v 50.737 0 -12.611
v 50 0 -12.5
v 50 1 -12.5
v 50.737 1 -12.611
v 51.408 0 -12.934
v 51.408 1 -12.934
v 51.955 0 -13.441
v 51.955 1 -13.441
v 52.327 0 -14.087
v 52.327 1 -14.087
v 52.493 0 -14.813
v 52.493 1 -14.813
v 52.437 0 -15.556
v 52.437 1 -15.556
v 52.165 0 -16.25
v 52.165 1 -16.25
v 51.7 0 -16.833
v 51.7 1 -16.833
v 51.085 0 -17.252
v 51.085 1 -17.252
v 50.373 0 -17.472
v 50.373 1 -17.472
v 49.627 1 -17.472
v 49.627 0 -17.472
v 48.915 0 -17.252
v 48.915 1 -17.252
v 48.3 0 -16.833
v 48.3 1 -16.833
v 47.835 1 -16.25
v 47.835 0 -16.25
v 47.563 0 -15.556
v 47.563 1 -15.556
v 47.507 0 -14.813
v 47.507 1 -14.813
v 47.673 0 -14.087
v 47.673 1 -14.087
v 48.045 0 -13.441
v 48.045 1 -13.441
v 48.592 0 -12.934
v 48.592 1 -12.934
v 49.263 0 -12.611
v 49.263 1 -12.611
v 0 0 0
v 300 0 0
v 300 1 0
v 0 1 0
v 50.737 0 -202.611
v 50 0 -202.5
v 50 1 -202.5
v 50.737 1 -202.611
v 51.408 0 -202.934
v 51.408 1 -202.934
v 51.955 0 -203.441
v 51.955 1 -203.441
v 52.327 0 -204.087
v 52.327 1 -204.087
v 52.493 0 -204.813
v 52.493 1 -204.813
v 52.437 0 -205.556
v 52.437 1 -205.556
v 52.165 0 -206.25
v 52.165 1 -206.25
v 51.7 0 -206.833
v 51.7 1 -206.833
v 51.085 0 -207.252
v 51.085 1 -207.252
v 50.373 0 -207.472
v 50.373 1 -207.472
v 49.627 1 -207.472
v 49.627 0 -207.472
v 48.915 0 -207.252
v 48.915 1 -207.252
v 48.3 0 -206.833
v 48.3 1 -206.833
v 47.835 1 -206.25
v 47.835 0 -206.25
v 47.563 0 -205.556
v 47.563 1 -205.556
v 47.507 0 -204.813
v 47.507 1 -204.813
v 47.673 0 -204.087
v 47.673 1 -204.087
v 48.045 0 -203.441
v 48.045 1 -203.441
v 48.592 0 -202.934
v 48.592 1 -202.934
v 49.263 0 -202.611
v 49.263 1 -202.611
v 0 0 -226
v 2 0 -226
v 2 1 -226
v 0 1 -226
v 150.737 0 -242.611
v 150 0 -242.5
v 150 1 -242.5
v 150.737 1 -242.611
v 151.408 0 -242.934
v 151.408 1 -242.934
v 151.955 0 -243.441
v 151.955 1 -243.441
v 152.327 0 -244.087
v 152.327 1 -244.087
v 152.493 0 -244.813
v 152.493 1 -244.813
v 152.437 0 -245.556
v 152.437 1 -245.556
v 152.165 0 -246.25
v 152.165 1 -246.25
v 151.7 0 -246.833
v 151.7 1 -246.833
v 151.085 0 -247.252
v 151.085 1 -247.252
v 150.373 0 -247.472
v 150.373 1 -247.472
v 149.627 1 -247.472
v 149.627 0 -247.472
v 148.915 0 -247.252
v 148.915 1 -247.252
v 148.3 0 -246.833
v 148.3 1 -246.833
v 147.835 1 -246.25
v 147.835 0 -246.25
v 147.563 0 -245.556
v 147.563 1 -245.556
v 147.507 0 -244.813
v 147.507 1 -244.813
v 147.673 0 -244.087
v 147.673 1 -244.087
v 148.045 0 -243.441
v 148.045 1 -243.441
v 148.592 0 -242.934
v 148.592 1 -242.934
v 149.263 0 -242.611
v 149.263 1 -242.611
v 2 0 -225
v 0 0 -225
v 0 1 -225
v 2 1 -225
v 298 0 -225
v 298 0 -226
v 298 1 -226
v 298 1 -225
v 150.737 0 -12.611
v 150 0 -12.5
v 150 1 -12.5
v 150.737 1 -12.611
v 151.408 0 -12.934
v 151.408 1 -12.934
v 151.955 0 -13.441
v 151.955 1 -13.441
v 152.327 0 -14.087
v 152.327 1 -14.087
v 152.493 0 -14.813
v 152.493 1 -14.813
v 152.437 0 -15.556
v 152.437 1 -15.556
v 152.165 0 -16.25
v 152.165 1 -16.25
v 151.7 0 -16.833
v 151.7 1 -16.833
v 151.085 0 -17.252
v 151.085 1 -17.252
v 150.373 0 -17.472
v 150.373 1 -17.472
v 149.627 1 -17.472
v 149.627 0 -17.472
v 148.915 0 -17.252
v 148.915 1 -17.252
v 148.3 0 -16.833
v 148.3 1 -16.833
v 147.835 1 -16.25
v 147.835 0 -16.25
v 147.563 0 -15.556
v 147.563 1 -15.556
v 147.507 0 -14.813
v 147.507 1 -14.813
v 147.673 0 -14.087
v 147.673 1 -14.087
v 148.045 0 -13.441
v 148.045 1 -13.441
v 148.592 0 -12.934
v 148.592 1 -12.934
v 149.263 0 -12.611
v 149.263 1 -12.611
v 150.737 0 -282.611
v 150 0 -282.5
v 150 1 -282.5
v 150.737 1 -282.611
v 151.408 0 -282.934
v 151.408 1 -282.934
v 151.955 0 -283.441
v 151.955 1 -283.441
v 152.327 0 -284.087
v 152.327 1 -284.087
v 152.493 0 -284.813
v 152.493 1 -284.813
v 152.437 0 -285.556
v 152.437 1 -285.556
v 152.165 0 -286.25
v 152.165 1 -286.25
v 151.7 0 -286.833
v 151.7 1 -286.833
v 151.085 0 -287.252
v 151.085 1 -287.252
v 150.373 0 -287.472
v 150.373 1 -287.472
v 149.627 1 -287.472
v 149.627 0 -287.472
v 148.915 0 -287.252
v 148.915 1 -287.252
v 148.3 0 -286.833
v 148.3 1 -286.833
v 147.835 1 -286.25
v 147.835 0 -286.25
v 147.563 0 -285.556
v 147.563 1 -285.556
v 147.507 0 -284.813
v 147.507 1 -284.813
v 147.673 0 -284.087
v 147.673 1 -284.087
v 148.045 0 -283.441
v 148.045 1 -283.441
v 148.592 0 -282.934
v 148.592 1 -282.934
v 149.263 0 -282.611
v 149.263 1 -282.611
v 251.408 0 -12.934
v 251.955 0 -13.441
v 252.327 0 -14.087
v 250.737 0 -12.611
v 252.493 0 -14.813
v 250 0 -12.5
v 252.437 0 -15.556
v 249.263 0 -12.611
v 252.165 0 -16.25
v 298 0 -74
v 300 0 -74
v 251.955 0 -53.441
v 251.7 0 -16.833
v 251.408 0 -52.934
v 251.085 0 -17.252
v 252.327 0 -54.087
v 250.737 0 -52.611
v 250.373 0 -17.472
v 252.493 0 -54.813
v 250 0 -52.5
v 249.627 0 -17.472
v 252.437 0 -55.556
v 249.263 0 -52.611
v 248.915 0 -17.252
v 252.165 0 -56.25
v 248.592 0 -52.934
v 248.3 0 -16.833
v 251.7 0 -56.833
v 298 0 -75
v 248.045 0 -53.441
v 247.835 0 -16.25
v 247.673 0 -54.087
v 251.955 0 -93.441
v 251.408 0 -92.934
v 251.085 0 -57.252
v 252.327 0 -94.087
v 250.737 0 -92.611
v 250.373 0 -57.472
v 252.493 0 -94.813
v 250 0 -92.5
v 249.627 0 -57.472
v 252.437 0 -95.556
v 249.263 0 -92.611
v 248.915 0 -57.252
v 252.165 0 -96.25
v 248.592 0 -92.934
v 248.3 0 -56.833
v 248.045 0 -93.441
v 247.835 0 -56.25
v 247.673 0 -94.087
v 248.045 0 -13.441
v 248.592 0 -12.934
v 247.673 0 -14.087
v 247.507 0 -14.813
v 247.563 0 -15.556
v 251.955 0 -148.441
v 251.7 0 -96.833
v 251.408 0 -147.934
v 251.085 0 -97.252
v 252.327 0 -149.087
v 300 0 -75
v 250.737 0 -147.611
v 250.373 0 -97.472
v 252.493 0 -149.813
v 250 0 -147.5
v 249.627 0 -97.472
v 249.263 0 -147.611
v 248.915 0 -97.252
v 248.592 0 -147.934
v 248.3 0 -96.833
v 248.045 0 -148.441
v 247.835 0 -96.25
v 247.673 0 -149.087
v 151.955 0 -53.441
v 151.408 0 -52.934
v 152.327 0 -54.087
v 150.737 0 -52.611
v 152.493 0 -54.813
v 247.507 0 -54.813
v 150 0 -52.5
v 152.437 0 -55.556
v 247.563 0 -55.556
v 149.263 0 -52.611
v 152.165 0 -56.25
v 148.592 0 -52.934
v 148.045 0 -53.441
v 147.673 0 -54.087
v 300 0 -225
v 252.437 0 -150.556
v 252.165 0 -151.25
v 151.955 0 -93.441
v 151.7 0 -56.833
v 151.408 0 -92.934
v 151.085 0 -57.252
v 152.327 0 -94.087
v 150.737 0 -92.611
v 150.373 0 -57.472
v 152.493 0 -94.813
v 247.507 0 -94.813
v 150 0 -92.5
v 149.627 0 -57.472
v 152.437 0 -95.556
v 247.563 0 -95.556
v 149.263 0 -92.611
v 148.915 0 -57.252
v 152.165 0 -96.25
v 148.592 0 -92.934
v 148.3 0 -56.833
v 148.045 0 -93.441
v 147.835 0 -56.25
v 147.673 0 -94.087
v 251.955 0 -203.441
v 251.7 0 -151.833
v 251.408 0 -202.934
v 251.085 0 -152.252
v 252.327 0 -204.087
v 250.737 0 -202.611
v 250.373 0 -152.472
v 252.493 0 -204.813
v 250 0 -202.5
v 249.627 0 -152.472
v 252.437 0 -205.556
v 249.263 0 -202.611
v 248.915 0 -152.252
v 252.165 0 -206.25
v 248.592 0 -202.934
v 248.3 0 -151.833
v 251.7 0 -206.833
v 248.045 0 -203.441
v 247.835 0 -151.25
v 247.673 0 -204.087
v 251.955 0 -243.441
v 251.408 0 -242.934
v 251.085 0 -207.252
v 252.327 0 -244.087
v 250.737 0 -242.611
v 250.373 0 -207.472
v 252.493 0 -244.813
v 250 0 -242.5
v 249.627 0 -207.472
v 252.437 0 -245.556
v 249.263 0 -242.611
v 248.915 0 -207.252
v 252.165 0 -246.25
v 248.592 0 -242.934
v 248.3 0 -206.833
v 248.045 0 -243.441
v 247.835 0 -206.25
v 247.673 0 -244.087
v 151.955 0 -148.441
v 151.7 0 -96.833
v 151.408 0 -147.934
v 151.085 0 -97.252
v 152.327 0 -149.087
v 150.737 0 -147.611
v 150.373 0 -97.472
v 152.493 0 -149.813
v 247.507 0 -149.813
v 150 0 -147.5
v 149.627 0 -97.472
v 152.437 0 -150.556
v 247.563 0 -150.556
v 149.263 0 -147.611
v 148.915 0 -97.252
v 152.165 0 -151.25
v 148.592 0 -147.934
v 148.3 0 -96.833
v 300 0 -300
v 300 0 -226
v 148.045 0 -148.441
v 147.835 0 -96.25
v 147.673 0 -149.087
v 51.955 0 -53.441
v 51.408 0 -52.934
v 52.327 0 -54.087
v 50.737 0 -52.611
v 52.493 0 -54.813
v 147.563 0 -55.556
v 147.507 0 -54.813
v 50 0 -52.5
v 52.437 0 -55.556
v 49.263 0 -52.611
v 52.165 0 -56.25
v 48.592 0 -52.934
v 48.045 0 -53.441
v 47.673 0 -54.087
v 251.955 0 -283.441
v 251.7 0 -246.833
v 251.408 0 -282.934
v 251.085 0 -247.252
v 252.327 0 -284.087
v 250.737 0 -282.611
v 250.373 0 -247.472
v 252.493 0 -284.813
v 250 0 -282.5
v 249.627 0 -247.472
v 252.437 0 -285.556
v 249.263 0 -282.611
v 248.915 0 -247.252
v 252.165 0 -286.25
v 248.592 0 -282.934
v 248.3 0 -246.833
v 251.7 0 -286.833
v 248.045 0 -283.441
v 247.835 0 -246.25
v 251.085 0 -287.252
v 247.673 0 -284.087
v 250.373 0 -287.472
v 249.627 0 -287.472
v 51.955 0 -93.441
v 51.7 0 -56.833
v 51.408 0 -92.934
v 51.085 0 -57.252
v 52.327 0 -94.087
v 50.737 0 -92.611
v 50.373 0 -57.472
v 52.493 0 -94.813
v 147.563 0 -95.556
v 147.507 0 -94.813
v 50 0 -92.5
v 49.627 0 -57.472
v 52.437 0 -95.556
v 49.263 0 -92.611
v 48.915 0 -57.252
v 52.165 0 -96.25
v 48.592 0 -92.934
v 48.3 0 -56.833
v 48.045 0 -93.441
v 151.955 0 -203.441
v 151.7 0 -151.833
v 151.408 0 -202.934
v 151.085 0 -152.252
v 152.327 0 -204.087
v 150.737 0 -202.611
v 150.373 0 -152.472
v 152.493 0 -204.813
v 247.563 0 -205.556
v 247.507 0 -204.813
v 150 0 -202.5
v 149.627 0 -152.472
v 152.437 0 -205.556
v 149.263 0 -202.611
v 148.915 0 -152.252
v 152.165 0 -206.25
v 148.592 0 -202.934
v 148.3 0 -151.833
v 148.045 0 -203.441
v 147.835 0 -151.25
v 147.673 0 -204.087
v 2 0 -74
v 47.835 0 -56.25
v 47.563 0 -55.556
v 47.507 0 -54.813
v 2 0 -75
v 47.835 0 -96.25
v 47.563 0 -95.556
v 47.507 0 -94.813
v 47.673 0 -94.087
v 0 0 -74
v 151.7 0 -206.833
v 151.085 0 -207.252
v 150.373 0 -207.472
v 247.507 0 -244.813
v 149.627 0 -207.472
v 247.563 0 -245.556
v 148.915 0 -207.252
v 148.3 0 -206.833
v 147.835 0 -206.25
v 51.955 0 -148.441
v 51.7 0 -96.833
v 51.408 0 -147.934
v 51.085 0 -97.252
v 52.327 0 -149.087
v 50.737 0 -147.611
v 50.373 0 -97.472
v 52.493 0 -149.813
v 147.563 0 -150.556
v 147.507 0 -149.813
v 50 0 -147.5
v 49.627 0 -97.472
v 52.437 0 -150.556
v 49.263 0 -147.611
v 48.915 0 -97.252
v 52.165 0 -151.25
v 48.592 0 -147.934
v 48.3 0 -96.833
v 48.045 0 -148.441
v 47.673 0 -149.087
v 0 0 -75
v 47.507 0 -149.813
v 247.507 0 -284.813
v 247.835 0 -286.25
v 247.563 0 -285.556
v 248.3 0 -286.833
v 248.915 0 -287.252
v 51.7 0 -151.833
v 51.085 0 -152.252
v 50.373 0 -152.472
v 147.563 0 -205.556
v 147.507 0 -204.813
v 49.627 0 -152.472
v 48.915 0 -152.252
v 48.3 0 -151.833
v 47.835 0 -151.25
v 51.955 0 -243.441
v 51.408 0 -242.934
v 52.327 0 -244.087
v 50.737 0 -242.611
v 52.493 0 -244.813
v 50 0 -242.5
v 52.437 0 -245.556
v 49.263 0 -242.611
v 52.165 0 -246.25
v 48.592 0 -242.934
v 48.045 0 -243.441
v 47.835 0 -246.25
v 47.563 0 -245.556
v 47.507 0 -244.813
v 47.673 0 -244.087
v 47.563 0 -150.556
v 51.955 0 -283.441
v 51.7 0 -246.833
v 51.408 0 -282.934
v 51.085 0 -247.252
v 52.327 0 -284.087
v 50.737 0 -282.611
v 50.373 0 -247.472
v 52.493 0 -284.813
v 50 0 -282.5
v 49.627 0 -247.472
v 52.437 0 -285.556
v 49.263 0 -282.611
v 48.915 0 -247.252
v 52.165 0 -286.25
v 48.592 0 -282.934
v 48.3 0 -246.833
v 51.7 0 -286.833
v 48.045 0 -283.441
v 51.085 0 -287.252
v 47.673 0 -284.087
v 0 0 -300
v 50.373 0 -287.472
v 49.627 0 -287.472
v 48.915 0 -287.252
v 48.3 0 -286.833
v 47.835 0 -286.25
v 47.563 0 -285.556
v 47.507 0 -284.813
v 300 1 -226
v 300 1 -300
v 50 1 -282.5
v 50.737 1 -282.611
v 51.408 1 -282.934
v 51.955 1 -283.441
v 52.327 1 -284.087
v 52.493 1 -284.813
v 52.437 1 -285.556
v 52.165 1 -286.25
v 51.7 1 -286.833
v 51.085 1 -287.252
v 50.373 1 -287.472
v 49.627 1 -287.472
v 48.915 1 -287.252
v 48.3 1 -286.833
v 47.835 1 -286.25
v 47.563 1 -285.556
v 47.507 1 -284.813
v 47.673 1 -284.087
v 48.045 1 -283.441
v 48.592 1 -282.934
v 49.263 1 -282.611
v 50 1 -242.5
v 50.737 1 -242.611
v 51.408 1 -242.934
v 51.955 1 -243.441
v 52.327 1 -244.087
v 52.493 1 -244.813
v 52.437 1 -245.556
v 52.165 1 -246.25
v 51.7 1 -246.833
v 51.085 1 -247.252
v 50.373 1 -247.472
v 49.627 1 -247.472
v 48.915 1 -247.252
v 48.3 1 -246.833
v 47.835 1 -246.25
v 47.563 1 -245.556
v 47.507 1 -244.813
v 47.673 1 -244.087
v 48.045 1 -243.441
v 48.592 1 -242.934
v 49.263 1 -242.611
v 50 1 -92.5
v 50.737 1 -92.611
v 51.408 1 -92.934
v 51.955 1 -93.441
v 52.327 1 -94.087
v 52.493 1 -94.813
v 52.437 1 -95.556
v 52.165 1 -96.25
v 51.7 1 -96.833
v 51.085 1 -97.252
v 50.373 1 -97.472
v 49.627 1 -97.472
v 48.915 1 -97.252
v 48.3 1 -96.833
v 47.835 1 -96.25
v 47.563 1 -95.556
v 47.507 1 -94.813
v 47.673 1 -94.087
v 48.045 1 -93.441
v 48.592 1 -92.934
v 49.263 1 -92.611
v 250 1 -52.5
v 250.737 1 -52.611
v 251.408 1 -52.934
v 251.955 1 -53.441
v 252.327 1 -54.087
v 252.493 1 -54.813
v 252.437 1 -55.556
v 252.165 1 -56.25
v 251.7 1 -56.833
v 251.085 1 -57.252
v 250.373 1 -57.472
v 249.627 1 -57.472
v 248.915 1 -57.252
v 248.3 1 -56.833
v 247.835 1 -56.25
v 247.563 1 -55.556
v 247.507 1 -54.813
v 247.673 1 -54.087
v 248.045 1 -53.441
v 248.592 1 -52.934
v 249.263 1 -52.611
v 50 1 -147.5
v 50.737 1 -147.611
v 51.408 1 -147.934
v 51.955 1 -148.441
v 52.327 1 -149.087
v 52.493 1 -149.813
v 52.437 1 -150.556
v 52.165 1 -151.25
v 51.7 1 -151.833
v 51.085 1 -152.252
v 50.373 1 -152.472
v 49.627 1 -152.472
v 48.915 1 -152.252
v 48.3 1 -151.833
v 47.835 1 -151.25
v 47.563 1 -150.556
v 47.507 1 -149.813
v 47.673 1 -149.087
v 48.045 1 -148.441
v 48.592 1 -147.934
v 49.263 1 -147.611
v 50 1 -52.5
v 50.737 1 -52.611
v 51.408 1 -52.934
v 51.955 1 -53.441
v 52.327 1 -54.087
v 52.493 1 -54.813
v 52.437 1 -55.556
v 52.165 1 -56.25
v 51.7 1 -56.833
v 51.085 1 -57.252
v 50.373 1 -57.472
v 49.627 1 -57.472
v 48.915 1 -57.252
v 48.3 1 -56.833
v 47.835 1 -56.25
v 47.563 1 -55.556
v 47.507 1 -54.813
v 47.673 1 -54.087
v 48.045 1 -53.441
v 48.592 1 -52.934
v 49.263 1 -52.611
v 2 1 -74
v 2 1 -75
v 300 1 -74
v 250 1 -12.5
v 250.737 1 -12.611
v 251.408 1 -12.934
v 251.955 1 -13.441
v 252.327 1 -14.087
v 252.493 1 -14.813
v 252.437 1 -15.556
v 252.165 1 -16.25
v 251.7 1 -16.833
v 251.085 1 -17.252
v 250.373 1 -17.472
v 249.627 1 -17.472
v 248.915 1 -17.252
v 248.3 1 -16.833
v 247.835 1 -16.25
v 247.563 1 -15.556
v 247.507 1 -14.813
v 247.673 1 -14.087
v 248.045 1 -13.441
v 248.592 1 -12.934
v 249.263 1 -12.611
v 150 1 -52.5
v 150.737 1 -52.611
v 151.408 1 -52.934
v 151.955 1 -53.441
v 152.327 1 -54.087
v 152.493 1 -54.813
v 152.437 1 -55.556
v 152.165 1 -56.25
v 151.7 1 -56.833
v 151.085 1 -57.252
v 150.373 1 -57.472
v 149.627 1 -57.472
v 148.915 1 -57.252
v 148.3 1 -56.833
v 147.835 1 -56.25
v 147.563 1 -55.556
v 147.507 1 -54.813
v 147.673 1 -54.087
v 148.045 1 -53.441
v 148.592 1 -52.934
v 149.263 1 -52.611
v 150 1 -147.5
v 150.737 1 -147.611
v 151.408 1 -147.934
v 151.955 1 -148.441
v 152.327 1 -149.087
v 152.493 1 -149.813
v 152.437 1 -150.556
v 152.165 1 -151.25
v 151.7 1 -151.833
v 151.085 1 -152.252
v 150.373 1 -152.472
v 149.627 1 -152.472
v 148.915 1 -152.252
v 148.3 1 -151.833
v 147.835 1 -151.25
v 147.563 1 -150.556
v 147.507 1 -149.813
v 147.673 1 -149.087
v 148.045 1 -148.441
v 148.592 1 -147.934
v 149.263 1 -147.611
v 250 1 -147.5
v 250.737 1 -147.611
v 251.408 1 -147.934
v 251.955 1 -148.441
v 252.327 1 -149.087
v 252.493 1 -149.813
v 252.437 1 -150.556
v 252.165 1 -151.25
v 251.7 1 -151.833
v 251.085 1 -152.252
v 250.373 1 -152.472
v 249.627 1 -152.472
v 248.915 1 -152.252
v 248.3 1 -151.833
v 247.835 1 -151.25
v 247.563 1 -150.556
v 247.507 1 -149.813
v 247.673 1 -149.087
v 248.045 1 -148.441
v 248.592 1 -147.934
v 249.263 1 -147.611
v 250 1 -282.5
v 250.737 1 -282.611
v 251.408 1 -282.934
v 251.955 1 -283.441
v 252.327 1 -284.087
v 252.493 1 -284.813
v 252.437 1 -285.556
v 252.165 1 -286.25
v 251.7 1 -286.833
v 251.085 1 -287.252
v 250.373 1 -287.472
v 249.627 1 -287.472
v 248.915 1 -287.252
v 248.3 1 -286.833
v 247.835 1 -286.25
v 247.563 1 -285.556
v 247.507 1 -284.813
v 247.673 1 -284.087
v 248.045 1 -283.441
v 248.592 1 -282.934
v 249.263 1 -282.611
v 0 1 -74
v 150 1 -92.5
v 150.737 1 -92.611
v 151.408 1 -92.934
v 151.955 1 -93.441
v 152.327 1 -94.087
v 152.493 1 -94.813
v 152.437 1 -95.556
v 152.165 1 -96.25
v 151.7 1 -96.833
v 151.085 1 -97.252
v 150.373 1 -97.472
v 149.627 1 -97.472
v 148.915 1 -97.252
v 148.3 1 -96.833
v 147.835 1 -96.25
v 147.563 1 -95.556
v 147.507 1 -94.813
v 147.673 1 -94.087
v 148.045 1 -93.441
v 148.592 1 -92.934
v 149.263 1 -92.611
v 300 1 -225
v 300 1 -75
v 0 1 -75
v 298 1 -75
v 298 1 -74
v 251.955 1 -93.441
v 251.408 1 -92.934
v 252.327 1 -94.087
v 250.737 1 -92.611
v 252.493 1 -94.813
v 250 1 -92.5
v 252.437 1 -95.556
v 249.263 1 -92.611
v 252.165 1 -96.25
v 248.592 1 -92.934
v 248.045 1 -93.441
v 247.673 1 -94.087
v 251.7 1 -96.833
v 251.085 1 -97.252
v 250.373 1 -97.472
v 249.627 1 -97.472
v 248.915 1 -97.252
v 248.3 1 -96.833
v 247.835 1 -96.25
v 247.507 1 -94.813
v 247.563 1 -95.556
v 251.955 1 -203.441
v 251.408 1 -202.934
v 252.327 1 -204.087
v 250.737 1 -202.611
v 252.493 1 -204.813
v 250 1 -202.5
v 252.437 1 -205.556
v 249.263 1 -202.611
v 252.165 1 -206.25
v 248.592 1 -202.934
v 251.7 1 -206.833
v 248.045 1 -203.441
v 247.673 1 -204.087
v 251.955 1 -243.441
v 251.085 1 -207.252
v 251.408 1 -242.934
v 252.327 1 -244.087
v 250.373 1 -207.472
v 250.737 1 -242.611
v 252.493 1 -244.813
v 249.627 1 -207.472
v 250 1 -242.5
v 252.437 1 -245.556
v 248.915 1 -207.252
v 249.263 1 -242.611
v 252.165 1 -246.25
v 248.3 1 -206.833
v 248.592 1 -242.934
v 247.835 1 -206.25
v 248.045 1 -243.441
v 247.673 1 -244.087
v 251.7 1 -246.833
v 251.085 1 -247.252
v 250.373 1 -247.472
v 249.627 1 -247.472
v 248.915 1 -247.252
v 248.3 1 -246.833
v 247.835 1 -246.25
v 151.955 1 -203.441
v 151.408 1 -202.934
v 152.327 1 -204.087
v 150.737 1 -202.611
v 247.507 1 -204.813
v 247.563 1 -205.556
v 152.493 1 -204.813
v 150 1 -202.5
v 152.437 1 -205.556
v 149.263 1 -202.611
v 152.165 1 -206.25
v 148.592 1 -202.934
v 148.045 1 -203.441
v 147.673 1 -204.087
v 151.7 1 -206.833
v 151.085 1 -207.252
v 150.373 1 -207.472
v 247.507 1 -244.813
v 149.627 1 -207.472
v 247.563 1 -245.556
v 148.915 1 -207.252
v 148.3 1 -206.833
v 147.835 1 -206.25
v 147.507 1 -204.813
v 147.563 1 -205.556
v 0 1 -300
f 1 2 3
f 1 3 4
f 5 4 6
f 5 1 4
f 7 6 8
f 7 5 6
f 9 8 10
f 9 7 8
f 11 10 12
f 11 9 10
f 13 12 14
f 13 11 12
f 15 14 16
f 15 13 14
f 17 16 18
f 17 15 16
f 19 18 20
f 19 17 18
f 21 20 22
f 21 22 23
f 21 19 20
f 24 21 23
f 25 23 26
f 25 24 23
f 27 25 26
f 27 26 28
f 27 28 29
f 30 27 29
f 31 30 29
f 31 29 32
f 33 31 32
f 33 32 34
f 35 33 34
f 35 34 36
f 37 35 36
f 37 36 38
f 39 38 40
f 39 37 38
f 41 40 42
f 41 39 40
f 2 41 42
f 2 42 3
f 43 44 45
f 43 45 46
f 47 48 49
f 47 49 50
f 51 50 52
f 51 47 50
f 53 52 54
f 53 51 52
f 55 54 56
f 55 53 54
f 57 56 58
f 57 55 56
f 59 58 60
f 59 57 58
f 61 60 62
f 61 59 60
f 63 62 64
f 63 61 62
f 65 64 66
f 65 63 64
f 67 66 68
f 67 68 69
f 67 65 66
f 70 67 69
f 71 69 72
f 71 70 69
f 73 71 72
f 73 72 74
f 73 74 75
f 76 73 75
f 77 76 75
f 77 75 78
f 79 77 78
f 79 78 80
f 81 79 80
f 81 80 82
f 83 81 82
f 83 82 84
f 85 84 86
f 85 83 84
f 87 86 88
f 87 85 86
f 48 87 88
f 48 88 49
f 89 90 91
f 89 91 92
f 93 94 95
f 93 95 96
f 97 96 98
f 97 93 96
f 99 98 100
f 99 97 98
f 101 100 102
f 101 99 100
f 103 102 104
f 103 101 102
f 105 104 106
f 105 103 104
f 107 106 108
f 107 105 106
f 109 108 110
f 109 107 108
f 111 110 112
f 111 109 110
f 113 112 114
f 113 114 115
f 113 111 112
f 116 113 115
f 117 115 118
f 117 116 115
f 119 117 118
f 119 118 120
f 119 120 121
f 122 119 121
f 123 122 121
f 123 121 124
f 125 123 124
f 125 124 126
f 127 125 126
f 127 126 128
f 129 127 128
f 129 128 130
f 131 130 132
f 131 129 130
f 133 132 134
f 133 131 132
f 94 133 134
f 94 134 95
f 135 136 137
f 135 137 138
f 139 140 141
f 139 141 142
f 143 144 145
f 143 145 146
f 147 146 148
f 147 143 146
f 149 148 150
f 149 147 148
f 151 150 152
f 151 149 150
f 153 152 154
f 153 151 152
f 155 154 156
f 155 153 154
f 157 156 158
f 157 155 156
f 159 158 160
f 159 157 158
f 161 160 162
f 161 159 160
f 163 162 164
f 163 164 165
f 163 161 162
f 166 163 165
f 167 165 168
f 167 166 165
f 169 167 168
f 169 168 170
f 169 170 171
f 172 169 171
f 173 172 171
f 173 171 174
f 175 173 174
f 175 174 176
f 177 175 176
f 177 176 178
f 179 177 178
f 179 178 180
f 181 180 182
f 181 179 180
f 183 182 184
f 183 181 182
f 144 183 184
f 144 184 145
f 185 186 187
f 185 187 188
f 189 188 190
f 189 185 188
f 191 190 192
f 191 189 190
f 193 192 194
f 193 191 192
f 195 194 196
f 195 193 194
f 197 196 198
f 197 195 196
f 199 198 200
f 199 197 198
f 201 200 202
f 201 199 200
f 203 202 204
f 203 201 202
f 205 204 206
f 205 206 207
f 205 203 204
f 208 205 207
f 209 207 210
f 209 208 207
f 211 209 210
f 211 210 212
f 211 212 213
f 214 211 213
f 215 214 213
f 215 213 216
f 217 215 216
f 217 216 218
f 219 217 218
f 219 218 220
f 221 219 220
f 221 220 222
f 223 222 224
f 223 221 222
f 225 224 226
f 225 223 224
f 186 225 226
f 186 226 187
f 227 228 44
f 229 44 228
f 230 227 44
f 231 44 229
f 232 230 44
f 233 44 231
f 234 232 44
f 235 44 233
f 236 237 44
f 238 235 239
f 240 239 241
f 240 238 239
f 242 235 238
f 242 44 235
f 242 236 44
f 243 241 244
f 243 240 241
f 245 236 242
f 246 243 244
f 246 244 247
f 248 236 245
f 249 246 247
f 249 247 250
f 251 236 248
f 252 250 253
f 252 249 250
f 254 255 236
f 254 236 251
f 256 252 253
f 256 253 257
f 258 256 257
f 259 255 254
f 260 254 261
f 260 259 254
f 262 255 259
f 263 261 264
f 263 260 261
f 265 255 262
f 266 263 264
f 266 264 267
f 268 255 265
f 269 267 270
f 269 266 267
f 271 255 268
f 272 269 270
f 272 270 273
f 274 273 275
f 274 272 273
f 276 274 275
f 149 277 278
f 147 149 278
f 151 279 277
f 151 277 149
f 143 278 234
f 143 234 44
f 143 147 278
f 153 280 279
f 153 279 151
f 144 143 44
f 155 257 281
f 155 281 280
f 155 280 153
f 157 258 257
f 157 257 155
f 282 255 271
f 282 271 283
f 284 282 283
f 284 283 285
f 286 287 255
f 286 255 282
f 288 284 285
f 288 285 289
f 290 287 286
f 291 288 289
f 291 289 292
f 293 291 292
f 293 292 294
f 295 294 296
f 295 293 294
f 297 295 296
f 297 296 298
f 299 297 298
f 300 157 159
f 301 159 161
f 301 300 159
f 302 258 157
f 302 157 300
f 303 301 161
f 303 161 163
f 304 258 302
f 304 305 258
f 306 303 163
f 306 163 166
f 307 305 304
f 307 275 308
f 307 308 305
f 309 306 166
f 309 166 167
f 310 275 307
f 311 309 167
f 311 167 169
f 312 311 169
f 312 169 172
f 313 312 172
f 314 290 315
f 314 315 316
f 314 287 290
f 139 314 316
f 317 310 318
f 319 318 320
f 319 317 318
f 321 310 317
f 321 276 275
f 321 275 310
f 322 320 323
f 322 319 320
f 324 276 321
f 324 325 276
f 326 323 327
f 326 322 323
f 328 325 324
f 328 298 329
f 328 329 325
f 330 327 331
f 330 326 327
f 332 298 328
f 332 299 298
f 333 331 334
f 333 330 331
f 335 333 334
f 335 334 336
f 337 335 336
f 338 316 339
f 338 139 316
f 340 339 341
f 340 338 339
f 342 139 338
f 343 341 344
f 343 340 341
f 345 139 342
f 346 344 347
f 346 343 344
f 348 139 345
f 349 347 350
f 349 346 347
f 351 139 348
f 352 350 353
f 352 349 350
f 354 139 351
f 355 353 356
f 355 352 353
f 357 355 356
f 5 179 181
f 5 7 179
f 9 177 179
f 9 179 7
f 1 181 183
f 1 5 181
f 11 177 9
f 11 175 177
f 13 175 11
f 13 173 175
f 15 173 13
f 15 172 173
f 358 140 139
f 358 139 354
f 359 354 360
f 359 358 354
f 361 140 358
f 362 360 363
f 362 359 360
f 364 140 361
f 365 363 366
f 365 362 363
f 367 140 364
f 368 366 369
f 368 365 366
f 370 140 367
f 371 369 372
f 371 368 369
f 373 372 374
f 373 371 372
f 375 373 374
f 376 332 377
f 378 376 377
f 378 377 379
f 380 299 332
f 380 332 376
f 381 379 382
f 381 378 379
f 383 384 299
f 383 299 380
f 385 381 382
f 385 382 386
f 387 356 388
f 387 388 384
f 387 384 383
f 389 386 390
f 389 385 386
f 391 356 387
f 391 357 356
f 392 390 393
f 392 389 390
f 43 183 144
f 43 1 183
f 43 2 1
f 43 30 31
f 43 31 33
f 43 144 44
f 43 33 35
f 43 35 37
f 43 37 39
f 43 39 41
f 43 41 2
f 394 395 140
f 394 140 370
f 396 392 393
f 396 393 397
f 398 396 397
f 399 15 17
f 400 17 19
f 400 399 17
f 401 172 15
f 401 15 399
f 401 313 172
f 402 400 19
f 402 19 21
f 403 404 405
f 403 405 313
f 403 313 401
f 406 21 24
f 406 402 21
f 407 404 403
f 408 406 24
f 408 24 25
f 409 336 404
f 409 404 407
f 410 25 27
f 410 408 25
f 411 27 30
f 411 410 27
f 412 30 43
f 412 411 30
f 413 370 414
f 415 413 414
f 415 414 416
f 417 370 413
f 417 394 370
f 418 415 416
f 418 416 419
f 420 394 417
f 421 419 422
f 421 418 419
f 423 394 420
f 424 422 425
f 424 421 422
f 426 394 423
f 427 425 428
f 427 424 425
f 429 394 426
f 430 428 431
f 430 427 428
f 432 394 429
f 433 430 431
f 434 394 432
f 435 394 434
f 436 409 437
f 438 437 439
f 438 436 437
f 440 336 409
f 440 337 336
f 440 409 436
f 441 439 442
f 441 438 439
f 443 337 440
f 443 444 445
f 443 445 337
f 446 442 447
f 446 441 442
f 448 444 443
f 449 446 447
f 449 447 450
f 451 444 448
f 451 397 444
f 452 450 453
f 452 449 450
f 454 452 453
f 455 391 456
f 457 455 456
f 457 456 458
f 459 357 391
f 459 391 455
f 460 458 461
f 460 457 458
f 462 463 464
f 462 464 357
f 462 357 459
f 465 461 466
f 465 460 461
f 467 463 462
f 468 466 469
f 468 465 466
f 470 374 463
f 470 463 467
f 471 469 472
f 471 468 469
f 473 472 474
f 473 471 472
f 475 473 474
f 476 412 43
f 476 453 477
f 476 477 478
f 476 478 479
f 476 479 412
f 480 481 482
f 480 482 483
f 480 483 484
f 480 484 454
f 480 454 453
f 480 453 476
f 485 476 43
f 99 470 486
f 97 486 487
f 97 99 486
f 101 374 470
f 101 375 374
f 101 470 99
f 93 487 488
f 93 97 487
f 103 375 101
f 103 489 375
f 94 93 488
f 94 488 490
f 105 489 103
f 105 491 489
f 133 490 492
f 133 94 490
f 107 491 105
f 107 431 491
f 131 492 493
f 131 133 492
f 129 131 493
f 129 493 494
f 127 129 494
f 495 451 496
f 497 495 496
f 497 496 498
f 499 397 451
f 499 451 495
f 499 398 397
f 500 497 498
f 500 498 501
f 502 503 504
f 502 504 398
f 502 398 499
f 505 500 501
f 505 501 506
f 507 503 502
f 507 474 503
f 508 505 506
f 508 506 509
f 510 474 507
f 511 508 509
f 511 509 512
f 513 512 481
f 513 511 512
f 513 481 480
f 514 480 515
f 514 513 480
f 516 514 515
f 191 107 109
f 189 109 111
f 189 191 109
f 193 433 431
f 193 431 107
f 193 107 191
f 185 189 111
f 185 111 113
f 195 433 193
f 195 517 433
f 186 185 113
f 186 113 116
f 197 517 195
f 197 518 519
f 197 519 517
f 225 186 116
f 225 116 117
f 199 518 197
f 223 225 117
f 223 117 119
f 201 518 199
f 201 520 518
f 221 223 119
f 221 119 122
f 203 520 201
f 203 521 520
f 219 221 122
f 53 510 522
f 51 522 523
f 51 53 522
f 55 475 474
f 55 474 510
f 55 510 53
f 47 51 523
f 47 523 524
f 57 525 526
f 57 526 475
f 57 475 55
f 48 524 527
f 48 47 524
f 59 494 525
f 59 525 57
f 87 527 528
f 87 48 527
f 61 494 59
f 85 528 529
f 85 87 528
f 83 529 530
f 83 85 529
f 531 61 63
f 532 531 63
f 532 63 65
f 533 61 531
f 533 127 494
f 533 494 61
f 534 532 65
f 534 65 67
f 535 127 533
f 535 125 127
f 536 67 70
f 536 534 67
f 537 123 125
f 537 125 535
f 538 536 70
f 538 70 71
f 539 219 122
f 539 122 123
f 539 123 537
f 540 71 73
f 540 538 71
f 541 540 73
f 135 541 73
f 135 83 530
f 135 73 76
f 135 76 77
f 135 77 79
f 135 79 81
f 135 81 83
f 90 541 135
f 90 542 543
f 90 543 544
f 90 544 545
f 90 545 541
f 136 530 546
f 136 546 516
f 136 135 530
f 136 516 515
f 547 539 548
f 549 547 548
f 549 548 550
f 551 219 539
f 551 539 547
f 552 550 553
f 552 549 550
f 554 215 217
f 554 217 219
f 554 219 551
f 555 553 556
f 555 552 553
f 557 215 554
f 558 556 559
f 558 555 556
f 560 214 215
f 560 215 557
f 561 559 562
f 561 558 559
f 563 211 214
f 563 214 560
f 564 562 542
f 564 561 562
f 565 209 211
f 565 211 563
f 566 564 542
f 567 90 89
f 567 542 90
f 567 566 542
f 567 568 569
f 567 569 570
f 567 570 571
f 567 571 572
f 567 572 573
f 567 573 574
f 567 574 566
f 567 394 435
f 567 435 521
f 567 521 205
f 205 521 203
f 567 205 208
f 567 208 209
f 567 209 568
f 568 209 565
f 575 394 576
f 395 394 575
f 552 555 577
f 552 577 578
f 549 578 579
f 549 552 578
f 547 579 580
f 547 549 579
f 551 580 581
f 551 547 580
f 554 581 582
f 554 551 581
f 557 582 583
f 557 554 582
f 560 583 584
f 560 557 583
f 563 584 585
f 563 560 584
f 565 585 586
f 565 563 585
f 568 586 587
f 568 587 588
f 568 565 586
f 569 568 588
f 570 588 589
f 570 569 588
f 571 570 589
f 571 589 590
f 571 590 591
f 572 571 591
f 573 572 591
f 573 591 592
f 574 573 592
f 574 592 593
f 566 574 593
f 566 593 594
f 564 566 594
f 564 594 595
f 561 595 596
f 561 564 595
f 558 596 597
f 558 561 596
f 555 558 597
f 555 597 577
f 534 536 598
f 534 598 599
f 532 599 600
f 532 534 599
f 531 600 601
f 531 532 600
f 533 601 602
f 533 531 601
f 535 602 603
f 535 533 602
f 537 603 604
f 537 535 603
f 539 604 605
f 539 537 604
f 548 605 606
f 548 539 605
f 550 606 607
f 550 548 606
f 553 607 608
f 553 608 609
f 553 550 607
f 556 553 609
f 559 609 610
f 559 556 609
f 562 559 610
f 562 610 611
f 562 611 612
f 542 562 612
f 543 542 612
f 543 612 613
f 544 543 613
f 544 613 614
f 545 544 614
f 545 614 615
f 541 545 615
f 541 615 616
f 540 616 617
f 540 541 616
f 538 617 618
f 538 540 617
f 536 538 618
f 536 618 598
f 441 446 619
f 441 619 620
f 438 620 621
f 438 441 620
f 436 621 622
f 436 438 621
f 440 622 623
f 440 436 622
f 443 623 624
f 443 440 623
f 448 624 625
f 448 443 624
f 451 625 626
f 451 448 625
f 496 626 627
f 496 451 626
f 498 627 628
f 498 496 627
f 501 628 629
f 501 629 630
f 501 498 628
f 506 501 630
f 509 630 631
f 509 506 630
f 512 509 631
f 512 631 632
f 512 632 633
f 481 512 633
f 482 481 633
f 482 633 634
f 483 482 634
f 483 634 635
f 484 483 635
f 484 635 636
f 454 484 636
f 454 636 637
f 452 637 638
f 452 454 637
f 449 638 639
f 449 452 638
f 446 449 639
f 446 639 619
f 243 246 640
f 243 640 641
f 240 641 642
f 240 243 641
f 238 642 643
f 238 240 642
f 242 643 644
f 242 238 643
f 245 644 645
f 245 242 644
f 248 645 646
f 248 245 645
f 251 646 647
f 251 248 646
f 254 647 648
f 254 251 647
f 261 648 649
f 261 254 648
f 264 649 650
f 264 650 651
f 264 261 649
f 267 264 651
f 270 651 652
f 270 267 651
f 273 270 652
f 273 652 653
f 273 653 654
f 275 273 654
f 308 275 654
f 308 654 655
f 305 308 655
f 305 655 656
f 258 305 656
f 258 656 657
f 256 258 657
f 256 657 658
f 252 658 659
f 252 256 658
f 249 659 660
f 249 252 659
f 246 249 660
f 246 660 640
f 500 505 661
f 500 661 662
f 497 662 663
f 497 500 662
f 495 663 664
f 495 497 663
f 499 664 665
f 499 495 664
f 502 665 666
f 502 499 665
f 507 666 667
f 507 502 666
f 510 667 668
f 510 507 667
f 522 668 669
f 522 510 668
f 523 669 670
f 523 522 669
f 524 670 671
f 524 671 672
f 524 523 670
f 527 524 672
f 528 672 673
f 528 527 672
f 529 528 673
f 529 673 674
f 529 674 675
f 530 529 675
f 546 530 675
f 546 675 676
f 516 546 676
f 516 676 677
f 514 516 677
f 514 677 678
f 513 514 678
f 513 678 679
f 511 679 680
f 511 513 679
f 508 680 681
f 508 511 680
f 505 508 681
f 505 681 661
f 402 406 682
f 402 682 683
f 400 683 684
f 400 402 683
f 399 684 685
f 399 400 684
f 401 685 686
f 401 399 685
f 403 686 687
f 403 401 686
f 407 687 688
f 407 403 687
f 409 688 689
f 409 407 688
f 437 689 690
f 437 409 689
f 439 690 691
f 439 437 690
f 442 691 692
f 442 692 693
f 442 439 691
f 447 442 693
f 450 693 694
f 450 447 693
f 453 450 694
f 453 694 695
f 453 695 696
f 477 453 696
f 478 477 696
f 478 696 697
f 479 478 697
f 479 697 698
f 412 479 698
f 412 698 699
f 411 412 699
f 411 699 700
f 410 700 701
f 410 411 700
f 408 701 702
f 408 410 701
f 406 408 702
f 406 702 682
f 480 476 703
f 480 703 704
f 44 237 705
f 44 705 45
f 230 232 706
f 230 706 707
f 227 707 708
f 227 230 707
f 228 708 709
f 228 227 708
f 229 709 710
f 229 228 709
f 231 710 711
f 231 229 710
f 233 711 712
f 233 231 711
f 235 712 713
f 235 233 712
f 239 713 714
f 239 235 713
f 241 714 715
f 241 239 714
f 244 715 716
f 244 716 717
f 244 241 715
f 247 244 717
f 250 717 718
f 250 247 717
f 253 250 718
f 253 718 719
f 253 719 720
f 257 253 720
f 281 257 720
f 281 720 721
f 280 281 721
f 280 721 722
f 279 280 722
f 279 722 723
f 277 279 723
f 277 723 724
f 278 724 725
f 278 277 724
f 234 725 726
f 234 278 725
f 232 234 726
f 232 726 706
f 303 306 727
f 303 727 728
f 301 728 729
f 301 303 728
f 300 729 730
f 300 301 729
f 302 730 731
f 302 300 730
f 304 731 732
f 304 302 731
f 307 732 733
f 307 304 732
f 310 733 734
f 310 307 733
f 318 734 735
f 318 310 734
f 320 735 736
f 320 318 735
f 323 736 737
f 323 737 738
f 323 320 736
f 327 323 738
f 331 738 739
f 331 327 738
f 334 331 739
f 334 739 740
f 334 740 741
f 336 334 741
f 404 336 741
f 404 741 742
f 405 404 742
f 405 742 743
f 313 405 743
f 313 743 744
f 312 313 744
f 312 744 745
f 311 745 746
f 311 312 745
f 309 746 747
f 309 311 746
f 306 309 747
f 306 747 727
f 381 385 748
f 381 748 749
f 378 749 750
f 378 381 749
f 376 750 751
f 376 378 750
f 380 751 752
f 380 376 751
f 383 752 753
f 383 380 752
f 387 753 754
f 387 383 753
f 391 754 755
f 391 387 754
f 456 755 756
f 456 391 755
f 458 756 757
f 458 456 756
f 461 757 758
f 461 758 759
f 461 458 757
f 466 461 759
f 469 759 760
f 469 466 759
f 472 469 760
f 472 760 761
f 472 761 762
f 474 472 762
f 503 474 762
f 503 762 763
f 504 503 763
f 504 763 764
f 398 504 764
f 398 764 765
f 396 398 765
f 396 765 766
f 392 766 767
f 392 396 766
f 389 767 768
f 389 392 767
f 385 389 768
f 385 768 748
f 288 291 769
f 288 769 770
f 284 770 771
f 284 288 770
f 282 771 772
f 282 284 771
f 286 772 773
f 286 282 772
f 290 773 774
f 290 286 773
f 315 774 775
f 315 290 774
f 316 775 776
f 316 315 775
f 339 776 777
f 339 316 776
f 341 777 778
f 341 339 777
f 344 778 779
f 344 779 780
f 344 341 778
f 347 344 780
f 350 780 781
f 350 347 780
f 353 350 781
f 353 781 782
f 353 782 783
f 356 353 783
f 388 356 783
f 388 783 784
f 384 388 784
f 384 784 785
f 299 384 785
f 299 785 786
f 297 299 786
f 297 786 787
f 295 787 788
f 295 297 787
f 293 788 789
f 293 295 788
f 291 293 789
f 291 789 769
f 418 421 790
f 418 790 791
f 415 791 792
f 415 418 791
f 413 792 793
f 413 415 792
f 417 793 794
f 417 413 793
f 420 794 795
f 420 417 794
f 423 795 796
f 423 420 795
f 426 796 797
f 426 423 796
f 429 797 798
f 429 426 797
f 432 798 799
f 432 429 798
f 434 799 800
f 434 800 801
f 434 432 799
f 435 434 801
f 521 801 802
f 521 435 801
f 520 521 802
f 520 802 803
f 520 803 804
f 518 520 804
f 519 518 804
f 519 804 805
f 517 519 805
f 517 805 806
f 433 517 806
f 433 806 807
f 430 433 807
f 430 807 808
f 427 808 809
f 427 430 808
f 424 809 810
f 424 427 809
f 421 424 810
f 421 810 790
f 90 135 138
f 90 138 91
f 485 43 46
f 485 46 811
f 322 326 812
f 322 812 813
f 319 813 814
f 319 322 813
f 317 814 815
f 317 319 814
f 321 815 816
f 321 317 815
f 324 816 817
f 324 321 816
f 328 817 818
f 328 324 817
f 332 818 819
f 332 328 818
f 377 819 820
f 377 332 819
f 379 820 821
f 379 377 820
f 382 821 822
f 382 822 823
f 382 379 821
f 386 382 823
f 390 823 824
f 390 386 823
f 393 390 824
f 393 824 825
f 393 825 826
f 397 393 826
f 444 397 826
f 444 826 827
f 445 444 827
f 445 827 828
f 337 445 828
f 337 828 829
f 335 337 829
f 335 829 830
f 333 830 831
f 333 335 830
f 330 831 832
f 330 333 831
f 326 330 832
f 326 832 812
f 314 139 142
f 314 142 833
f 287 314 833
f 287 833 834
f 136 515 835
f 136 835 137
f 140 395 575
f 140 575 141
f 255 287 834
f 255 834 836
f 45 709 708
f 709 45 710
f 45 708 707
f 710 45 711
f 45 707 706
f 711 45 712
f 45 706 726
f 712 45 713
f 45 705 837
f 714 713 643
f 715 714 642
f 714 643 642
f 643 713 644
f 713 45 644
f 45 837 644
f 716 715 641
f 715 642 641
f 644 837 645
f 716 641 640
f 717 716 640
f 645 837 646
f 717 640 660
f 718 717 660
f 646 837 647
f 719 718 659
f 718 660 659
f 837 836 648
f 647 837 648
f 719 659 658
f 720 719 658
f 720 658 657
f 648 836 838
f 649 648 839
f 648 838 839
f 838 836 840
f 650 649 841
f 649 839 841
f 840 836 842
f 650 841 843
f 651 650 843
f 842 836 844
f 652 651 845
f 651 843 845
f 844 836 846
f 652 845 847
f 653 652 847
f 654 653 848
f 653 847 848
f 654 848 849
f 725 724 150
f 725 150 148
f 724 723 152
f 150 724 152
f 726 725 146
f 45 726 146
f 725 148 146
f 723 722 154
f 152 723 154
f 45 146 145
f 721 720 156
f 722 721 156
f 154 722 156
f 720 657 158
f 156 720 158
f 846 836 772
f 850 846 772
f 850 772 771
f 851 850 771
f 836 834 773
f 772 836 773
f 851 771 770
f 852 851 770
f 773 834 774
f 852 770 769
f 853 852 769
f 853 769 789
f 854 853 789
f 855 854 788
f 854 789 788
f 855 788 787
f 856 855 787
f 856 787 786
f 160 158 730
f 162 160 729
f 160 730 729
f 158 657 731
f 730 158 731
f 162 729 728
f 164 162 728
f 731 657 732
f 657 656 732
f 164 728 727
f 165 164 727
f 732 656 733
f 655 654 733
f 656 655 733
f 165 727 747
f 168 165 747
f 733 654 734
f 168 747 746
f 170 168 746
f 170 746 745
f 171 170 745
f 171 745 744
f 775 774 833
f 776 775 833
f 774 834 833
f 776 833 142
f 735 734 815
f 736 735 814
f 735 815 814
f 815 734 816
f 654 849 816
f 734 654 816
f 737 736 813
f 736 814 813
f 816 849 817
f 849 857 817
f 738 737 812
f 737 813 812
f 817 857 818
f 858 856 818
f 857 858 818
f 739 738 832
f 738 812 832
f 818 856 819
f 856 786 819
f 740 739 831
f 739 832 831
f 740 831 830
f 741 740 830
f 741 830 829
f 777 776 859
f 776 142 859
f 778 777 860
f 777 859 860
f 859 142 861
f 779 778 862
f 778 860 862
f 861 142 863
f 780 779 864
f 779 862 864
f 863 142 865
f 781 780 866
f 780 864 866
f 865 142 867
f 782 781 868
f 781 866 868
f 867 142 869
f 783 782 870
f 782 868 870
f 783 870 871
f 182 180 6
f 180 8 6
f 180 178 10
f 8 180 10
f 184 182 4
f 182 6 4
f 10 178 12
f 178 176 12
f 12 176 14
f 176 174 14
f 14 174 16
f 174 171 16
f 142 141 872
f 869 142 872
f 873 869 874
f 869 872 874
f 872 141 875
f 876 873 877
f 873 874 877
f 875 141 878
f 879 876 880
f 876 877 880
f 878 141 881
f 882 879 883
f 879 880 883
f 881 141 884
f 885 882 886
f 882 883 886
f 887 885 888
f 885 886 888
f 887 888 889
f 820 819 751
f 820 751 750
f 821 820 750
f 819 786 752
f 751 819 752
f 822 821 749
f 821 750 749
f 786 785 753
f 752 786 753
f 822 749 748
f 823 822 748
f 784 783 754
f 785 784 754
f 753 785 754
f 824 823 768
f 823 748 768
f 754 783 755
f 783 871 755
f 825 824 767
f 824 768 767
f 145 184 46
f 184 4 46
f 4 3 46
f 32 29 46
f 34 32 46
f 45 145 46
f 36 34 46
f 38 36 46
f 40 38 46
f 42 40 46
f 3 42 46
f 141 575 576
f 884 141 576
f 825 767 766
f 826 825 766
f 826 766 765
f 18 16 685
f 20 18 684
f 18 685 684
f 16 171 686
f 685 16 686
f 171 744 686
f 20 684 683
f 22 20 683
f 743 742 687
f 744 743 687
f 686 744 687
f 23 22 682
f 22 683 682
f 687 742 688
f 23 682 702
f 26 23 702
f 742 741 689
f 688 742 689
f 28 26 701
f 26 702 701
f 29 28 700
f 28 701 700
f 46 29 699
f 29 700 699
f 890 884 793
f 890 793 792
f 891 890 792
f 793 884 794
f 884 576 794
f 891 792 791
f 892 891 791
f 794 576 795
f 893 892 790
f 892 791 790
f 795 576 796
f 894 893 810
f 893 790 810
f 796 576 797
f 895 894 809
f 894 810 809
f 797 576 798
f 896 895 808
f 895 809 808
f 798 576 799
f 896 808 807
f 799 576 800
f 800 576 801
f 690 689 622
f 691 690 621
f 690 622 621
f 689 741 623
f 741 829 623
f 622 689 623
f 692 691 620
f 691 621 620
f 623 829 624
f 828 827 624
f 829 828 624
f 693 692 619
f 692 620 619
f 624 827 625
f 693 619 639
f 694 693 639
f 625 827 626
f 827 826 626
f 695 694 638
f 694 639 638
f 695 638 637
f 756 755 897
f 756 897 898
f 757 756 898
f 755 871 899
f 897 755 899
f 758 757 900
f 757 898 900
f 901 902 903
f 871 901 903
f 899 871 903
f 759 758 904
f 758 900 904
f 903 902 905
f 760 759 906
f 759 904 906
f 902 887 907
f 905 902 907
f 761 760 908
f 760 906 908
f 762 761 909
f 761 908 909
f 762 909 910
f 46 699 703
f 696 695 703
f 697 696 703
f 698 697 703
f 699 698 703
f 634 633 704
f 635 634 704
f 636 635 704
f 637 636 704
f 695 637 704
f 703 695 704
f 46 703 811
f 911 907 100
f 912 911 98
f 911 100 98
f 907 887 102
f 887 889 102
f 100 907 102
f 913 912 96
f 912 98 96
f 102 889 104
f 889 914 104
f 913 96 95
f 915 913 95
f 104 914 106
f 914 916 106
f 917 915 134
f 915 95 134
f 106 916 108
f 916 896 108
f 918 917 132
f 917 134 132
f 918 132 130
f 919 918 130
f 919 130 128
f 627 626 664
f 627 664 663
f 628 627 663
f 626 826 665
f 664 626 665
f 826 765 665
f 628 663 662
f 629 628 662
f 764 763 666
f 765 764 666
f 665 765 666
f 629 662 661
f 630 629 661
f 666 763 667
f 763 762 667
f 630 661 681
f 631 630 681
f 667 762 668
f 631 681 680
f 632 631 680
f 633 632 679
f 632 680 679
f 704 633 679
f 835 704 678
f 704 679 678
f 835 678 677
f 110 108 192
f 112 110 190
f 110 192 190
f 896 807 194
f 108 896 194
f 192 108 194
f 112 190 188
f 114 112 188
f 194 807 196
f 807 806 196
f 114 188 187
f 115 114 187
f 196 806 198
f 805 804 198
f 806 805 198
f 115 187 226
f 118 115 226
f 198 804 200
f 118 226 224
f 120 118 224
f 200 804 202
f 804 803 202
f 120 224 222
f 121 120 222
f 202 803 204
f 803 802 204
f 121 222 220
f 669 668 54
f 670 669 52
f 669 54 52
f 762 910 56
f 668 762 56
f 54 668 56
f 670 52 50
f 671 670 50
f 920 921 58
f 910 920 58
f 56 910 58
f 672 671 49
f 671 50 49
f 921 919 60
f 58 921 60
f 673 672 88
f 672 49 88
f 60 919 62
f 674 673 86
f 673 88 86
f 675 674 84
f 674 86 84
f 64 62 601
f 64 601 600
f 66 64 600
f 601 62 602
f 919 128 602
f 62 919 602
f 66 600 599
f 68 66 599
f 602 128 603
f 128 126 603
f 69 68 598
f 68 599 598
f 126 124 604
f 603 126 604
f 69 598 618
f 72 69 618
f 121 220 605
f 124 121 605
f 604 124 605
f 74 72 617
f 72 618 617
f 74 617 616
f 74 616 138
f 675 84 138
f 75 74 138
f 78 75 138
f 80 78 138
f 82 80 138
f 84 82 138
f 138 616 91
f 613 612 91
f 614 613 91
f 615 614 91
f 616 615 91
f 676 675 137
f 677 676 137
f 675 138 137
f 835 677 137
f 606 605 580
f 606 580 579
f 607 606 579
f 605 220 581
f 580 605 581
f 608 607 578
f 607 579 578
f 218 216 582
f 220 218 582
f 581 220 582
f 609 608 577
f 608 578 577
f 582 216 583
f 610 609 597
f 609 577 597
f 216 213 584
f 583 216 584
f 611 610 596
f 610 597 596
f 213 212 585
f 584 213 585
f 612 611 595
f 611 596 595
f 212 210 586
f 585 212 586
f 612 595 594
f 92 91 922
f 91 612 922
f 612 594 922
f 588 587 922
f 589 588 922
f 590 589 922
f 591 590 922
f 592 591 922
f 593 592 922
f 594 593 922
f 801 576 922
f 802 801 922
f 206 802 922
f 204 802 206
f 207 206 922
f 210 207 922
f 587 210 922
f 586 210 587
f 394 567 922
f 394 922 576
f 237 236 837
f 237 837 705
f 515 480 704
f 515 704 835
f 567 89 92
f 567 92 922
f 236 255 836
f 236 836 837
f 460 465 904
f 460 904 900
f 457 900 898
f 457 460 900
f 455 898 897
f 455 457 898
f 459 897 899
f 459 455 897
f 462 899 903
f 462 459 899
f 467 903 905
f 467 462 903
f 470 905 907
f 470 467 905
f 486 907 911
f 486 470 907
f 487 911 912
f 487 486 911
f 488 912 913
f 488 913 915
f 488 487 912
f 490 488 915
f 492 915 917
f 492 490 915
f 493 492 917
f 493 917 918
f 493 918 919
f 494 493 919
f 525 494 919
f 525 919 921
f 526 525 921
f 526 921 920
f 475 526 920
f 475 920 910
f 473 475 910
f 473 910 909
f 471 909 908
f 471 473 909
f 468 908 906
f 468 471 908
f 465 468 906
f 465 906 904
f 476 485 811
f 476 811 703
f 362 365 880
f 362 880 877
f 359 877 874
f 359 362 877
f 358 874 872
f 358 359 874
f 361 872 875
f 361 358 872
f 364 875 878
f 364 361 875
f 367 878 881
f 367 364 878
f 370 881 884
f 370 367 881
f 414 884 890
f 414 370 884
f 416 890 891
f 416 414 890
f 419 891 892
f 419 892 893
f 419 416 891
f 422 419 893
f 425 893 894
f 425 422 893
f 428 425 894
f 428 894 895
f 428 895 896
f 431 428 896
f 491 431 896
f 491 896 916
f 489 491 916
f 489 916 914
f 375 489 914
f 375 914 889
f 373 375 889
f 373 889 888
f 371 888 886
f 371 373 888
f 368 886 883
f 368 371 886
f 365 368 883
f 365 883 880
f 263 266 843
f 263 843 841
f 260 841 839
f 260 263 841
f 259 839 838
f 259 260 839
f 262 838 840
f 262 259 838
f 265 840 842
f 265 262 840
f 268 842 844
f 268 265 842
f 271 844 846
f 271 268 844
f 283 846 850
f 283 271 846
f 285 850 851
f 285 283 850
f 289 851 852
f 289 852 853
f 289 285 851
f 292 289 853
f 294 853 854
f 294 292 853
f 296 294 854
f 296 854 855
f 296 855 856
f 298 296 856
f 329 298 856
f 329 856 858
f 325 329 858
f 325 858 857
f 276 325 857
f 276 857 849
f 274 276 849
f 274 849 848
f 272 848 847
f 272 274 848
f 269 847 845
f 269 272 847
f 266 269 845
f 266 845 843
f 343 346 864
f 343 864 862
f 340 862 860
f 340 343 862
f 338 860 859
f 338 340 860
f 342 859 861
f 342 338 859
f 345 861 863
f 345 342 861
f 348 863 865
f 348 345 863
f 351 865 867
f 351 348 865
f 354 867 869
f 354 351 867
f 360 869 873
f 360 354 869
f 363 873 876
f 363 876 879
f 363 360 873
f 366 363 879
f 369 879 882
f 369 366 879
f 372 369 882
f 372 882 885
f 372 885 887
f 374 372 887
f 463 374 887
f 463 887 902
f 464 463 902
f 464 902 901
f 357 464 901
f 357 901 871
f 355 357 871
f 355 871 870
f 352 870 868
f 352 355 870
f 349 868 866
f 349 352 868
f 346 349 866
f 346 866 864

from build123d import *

# Parameters (mm, degrees)
SKETCH1_R           = 2.5
BOSS_EXTRUDE1_DEPTH = 1


with BuildPart() as part:
    # Sketch1 → Boss-Extrude1 (new body)
    with BuildSketch(Plane(origin=(0, 0, 0), x_dir=(1, 0, 0), z_dir=(0, 1, 0))):
        Polygon((0, 0), (0, 74), (2, 74), (2, 75), (0, 75), (0, 225), (2, 225), (2, 226), (0, 226), (0, 300), (300, 300), (300, 226), (298, 226), (298, 225), (300, 225), (300, 75), (298, 75), (298, 74), (300, 74), (300, 0), align=None)
        with Locations(Location((50, 285, 0), (0, 0, 270))):
            Circle(SKETCH1_R, mode=Mode.SUBTRACT)
        with Locations(Location((50, 245, 0), (0, 0, 270))):
            Circle(SKETCH1_R, mode=Mode.SUBTRACT)
        with Locations(Location((50, 205, 0), (0, 0, 270))):
            Circle(SKETCH1_R, mode=Mode.SUBTRACT)
        with Locations(Location((50, 150, 0), (0, 0, 270))):
            Circle(SKETCH1_R, mode=Mode.SUBTRACT)
        with Locations(Location((50, 95, 0), (0, 0, 270))):
            Circle(SKETCH1_R, mode=Mode.SUBTRACT)
        with Locations(Location((50, 55, 0), (0, 0, 270))):
            Circle(SKETCH1_R, mode=Mode.SUBTRACT)
        with Locations(Location((50, 15, 0), (0, 0, 270))):
            Circle(SKETCH1_R, mode=Mode.SUBTRACT)
        with Locations(Location((150, 15, 0), (0, 0, 270))):
            Circle(SKETCH1_R, mode=Mode.SUBTRACT)
        with Locations(Location((150, 55, 0), (0, 0, 270))):
            Circle(SKETCH1_R, mode=Mode.SUBTRACT)
        with Locations(Location((150, 95, 0), (0, 0, 270))):
            Circle(SKETCH1_R, mode=Mode.SUBTRACT)
        with Locations(Location((150, 150, 0), (0, 0, 270))):
            Circle(SKETCH1_R, mode=Mode.SUBTRACT)
        with Locations(Location((150, 205, 0), (0, 0, 270))):
            Circle(SKETCH1_R, mode=Mode.SUBTRACT)
        with Locations(Location((150, 245, 0), (0, 0, 270))):
            Circle(SKETCH1_R, mode=Mode.SUBTRACT)
        with Locations(Location((150, 285, 0), (0, 0, 270))):
            Circle(SKETCH1_R, mode=Mode.SUBTRACT)
        with Locations(Location((250, 15, 0), (0, 0, 270))):
            Circle(SKETCH1_R, mode=Mode.SUBTRACT)
        with Locations(Location((250, 55, 0), (0, 0, 270))):
            Circle(SKETCH1_R, mode=Mode.SUBTRACT)
        with Locations(Location((250, 95, 0), (0, 0, 270))):
            Circle(SKETCH1_R, mode=Mode.SUBTRACT)
        with Locations(Location((250, 150, 0), (0, 0, 270))):
            Circle(SKETCH1_R, mode=Mode.SUBTRACT)
        with Locations(Location((250, 205, 0), (0, 0, 270))):
            Circle(SKETCH1_R, mode=Mode.SUBTRACT)
        with Locations(Location((250, 245, 0), (0, 0, 270))):
            Circle(SKETCH1_R, mode=Mode.SUBTRACT)
        with Locations(Location((250, 285, 0), (0, 0, 270))):
            Circle(SKETCH1_R, mode=Mode.SUBTRACT)
    extrude(amount=BOSS_EXTRUDE1_DEPTH)


solid = part.part
